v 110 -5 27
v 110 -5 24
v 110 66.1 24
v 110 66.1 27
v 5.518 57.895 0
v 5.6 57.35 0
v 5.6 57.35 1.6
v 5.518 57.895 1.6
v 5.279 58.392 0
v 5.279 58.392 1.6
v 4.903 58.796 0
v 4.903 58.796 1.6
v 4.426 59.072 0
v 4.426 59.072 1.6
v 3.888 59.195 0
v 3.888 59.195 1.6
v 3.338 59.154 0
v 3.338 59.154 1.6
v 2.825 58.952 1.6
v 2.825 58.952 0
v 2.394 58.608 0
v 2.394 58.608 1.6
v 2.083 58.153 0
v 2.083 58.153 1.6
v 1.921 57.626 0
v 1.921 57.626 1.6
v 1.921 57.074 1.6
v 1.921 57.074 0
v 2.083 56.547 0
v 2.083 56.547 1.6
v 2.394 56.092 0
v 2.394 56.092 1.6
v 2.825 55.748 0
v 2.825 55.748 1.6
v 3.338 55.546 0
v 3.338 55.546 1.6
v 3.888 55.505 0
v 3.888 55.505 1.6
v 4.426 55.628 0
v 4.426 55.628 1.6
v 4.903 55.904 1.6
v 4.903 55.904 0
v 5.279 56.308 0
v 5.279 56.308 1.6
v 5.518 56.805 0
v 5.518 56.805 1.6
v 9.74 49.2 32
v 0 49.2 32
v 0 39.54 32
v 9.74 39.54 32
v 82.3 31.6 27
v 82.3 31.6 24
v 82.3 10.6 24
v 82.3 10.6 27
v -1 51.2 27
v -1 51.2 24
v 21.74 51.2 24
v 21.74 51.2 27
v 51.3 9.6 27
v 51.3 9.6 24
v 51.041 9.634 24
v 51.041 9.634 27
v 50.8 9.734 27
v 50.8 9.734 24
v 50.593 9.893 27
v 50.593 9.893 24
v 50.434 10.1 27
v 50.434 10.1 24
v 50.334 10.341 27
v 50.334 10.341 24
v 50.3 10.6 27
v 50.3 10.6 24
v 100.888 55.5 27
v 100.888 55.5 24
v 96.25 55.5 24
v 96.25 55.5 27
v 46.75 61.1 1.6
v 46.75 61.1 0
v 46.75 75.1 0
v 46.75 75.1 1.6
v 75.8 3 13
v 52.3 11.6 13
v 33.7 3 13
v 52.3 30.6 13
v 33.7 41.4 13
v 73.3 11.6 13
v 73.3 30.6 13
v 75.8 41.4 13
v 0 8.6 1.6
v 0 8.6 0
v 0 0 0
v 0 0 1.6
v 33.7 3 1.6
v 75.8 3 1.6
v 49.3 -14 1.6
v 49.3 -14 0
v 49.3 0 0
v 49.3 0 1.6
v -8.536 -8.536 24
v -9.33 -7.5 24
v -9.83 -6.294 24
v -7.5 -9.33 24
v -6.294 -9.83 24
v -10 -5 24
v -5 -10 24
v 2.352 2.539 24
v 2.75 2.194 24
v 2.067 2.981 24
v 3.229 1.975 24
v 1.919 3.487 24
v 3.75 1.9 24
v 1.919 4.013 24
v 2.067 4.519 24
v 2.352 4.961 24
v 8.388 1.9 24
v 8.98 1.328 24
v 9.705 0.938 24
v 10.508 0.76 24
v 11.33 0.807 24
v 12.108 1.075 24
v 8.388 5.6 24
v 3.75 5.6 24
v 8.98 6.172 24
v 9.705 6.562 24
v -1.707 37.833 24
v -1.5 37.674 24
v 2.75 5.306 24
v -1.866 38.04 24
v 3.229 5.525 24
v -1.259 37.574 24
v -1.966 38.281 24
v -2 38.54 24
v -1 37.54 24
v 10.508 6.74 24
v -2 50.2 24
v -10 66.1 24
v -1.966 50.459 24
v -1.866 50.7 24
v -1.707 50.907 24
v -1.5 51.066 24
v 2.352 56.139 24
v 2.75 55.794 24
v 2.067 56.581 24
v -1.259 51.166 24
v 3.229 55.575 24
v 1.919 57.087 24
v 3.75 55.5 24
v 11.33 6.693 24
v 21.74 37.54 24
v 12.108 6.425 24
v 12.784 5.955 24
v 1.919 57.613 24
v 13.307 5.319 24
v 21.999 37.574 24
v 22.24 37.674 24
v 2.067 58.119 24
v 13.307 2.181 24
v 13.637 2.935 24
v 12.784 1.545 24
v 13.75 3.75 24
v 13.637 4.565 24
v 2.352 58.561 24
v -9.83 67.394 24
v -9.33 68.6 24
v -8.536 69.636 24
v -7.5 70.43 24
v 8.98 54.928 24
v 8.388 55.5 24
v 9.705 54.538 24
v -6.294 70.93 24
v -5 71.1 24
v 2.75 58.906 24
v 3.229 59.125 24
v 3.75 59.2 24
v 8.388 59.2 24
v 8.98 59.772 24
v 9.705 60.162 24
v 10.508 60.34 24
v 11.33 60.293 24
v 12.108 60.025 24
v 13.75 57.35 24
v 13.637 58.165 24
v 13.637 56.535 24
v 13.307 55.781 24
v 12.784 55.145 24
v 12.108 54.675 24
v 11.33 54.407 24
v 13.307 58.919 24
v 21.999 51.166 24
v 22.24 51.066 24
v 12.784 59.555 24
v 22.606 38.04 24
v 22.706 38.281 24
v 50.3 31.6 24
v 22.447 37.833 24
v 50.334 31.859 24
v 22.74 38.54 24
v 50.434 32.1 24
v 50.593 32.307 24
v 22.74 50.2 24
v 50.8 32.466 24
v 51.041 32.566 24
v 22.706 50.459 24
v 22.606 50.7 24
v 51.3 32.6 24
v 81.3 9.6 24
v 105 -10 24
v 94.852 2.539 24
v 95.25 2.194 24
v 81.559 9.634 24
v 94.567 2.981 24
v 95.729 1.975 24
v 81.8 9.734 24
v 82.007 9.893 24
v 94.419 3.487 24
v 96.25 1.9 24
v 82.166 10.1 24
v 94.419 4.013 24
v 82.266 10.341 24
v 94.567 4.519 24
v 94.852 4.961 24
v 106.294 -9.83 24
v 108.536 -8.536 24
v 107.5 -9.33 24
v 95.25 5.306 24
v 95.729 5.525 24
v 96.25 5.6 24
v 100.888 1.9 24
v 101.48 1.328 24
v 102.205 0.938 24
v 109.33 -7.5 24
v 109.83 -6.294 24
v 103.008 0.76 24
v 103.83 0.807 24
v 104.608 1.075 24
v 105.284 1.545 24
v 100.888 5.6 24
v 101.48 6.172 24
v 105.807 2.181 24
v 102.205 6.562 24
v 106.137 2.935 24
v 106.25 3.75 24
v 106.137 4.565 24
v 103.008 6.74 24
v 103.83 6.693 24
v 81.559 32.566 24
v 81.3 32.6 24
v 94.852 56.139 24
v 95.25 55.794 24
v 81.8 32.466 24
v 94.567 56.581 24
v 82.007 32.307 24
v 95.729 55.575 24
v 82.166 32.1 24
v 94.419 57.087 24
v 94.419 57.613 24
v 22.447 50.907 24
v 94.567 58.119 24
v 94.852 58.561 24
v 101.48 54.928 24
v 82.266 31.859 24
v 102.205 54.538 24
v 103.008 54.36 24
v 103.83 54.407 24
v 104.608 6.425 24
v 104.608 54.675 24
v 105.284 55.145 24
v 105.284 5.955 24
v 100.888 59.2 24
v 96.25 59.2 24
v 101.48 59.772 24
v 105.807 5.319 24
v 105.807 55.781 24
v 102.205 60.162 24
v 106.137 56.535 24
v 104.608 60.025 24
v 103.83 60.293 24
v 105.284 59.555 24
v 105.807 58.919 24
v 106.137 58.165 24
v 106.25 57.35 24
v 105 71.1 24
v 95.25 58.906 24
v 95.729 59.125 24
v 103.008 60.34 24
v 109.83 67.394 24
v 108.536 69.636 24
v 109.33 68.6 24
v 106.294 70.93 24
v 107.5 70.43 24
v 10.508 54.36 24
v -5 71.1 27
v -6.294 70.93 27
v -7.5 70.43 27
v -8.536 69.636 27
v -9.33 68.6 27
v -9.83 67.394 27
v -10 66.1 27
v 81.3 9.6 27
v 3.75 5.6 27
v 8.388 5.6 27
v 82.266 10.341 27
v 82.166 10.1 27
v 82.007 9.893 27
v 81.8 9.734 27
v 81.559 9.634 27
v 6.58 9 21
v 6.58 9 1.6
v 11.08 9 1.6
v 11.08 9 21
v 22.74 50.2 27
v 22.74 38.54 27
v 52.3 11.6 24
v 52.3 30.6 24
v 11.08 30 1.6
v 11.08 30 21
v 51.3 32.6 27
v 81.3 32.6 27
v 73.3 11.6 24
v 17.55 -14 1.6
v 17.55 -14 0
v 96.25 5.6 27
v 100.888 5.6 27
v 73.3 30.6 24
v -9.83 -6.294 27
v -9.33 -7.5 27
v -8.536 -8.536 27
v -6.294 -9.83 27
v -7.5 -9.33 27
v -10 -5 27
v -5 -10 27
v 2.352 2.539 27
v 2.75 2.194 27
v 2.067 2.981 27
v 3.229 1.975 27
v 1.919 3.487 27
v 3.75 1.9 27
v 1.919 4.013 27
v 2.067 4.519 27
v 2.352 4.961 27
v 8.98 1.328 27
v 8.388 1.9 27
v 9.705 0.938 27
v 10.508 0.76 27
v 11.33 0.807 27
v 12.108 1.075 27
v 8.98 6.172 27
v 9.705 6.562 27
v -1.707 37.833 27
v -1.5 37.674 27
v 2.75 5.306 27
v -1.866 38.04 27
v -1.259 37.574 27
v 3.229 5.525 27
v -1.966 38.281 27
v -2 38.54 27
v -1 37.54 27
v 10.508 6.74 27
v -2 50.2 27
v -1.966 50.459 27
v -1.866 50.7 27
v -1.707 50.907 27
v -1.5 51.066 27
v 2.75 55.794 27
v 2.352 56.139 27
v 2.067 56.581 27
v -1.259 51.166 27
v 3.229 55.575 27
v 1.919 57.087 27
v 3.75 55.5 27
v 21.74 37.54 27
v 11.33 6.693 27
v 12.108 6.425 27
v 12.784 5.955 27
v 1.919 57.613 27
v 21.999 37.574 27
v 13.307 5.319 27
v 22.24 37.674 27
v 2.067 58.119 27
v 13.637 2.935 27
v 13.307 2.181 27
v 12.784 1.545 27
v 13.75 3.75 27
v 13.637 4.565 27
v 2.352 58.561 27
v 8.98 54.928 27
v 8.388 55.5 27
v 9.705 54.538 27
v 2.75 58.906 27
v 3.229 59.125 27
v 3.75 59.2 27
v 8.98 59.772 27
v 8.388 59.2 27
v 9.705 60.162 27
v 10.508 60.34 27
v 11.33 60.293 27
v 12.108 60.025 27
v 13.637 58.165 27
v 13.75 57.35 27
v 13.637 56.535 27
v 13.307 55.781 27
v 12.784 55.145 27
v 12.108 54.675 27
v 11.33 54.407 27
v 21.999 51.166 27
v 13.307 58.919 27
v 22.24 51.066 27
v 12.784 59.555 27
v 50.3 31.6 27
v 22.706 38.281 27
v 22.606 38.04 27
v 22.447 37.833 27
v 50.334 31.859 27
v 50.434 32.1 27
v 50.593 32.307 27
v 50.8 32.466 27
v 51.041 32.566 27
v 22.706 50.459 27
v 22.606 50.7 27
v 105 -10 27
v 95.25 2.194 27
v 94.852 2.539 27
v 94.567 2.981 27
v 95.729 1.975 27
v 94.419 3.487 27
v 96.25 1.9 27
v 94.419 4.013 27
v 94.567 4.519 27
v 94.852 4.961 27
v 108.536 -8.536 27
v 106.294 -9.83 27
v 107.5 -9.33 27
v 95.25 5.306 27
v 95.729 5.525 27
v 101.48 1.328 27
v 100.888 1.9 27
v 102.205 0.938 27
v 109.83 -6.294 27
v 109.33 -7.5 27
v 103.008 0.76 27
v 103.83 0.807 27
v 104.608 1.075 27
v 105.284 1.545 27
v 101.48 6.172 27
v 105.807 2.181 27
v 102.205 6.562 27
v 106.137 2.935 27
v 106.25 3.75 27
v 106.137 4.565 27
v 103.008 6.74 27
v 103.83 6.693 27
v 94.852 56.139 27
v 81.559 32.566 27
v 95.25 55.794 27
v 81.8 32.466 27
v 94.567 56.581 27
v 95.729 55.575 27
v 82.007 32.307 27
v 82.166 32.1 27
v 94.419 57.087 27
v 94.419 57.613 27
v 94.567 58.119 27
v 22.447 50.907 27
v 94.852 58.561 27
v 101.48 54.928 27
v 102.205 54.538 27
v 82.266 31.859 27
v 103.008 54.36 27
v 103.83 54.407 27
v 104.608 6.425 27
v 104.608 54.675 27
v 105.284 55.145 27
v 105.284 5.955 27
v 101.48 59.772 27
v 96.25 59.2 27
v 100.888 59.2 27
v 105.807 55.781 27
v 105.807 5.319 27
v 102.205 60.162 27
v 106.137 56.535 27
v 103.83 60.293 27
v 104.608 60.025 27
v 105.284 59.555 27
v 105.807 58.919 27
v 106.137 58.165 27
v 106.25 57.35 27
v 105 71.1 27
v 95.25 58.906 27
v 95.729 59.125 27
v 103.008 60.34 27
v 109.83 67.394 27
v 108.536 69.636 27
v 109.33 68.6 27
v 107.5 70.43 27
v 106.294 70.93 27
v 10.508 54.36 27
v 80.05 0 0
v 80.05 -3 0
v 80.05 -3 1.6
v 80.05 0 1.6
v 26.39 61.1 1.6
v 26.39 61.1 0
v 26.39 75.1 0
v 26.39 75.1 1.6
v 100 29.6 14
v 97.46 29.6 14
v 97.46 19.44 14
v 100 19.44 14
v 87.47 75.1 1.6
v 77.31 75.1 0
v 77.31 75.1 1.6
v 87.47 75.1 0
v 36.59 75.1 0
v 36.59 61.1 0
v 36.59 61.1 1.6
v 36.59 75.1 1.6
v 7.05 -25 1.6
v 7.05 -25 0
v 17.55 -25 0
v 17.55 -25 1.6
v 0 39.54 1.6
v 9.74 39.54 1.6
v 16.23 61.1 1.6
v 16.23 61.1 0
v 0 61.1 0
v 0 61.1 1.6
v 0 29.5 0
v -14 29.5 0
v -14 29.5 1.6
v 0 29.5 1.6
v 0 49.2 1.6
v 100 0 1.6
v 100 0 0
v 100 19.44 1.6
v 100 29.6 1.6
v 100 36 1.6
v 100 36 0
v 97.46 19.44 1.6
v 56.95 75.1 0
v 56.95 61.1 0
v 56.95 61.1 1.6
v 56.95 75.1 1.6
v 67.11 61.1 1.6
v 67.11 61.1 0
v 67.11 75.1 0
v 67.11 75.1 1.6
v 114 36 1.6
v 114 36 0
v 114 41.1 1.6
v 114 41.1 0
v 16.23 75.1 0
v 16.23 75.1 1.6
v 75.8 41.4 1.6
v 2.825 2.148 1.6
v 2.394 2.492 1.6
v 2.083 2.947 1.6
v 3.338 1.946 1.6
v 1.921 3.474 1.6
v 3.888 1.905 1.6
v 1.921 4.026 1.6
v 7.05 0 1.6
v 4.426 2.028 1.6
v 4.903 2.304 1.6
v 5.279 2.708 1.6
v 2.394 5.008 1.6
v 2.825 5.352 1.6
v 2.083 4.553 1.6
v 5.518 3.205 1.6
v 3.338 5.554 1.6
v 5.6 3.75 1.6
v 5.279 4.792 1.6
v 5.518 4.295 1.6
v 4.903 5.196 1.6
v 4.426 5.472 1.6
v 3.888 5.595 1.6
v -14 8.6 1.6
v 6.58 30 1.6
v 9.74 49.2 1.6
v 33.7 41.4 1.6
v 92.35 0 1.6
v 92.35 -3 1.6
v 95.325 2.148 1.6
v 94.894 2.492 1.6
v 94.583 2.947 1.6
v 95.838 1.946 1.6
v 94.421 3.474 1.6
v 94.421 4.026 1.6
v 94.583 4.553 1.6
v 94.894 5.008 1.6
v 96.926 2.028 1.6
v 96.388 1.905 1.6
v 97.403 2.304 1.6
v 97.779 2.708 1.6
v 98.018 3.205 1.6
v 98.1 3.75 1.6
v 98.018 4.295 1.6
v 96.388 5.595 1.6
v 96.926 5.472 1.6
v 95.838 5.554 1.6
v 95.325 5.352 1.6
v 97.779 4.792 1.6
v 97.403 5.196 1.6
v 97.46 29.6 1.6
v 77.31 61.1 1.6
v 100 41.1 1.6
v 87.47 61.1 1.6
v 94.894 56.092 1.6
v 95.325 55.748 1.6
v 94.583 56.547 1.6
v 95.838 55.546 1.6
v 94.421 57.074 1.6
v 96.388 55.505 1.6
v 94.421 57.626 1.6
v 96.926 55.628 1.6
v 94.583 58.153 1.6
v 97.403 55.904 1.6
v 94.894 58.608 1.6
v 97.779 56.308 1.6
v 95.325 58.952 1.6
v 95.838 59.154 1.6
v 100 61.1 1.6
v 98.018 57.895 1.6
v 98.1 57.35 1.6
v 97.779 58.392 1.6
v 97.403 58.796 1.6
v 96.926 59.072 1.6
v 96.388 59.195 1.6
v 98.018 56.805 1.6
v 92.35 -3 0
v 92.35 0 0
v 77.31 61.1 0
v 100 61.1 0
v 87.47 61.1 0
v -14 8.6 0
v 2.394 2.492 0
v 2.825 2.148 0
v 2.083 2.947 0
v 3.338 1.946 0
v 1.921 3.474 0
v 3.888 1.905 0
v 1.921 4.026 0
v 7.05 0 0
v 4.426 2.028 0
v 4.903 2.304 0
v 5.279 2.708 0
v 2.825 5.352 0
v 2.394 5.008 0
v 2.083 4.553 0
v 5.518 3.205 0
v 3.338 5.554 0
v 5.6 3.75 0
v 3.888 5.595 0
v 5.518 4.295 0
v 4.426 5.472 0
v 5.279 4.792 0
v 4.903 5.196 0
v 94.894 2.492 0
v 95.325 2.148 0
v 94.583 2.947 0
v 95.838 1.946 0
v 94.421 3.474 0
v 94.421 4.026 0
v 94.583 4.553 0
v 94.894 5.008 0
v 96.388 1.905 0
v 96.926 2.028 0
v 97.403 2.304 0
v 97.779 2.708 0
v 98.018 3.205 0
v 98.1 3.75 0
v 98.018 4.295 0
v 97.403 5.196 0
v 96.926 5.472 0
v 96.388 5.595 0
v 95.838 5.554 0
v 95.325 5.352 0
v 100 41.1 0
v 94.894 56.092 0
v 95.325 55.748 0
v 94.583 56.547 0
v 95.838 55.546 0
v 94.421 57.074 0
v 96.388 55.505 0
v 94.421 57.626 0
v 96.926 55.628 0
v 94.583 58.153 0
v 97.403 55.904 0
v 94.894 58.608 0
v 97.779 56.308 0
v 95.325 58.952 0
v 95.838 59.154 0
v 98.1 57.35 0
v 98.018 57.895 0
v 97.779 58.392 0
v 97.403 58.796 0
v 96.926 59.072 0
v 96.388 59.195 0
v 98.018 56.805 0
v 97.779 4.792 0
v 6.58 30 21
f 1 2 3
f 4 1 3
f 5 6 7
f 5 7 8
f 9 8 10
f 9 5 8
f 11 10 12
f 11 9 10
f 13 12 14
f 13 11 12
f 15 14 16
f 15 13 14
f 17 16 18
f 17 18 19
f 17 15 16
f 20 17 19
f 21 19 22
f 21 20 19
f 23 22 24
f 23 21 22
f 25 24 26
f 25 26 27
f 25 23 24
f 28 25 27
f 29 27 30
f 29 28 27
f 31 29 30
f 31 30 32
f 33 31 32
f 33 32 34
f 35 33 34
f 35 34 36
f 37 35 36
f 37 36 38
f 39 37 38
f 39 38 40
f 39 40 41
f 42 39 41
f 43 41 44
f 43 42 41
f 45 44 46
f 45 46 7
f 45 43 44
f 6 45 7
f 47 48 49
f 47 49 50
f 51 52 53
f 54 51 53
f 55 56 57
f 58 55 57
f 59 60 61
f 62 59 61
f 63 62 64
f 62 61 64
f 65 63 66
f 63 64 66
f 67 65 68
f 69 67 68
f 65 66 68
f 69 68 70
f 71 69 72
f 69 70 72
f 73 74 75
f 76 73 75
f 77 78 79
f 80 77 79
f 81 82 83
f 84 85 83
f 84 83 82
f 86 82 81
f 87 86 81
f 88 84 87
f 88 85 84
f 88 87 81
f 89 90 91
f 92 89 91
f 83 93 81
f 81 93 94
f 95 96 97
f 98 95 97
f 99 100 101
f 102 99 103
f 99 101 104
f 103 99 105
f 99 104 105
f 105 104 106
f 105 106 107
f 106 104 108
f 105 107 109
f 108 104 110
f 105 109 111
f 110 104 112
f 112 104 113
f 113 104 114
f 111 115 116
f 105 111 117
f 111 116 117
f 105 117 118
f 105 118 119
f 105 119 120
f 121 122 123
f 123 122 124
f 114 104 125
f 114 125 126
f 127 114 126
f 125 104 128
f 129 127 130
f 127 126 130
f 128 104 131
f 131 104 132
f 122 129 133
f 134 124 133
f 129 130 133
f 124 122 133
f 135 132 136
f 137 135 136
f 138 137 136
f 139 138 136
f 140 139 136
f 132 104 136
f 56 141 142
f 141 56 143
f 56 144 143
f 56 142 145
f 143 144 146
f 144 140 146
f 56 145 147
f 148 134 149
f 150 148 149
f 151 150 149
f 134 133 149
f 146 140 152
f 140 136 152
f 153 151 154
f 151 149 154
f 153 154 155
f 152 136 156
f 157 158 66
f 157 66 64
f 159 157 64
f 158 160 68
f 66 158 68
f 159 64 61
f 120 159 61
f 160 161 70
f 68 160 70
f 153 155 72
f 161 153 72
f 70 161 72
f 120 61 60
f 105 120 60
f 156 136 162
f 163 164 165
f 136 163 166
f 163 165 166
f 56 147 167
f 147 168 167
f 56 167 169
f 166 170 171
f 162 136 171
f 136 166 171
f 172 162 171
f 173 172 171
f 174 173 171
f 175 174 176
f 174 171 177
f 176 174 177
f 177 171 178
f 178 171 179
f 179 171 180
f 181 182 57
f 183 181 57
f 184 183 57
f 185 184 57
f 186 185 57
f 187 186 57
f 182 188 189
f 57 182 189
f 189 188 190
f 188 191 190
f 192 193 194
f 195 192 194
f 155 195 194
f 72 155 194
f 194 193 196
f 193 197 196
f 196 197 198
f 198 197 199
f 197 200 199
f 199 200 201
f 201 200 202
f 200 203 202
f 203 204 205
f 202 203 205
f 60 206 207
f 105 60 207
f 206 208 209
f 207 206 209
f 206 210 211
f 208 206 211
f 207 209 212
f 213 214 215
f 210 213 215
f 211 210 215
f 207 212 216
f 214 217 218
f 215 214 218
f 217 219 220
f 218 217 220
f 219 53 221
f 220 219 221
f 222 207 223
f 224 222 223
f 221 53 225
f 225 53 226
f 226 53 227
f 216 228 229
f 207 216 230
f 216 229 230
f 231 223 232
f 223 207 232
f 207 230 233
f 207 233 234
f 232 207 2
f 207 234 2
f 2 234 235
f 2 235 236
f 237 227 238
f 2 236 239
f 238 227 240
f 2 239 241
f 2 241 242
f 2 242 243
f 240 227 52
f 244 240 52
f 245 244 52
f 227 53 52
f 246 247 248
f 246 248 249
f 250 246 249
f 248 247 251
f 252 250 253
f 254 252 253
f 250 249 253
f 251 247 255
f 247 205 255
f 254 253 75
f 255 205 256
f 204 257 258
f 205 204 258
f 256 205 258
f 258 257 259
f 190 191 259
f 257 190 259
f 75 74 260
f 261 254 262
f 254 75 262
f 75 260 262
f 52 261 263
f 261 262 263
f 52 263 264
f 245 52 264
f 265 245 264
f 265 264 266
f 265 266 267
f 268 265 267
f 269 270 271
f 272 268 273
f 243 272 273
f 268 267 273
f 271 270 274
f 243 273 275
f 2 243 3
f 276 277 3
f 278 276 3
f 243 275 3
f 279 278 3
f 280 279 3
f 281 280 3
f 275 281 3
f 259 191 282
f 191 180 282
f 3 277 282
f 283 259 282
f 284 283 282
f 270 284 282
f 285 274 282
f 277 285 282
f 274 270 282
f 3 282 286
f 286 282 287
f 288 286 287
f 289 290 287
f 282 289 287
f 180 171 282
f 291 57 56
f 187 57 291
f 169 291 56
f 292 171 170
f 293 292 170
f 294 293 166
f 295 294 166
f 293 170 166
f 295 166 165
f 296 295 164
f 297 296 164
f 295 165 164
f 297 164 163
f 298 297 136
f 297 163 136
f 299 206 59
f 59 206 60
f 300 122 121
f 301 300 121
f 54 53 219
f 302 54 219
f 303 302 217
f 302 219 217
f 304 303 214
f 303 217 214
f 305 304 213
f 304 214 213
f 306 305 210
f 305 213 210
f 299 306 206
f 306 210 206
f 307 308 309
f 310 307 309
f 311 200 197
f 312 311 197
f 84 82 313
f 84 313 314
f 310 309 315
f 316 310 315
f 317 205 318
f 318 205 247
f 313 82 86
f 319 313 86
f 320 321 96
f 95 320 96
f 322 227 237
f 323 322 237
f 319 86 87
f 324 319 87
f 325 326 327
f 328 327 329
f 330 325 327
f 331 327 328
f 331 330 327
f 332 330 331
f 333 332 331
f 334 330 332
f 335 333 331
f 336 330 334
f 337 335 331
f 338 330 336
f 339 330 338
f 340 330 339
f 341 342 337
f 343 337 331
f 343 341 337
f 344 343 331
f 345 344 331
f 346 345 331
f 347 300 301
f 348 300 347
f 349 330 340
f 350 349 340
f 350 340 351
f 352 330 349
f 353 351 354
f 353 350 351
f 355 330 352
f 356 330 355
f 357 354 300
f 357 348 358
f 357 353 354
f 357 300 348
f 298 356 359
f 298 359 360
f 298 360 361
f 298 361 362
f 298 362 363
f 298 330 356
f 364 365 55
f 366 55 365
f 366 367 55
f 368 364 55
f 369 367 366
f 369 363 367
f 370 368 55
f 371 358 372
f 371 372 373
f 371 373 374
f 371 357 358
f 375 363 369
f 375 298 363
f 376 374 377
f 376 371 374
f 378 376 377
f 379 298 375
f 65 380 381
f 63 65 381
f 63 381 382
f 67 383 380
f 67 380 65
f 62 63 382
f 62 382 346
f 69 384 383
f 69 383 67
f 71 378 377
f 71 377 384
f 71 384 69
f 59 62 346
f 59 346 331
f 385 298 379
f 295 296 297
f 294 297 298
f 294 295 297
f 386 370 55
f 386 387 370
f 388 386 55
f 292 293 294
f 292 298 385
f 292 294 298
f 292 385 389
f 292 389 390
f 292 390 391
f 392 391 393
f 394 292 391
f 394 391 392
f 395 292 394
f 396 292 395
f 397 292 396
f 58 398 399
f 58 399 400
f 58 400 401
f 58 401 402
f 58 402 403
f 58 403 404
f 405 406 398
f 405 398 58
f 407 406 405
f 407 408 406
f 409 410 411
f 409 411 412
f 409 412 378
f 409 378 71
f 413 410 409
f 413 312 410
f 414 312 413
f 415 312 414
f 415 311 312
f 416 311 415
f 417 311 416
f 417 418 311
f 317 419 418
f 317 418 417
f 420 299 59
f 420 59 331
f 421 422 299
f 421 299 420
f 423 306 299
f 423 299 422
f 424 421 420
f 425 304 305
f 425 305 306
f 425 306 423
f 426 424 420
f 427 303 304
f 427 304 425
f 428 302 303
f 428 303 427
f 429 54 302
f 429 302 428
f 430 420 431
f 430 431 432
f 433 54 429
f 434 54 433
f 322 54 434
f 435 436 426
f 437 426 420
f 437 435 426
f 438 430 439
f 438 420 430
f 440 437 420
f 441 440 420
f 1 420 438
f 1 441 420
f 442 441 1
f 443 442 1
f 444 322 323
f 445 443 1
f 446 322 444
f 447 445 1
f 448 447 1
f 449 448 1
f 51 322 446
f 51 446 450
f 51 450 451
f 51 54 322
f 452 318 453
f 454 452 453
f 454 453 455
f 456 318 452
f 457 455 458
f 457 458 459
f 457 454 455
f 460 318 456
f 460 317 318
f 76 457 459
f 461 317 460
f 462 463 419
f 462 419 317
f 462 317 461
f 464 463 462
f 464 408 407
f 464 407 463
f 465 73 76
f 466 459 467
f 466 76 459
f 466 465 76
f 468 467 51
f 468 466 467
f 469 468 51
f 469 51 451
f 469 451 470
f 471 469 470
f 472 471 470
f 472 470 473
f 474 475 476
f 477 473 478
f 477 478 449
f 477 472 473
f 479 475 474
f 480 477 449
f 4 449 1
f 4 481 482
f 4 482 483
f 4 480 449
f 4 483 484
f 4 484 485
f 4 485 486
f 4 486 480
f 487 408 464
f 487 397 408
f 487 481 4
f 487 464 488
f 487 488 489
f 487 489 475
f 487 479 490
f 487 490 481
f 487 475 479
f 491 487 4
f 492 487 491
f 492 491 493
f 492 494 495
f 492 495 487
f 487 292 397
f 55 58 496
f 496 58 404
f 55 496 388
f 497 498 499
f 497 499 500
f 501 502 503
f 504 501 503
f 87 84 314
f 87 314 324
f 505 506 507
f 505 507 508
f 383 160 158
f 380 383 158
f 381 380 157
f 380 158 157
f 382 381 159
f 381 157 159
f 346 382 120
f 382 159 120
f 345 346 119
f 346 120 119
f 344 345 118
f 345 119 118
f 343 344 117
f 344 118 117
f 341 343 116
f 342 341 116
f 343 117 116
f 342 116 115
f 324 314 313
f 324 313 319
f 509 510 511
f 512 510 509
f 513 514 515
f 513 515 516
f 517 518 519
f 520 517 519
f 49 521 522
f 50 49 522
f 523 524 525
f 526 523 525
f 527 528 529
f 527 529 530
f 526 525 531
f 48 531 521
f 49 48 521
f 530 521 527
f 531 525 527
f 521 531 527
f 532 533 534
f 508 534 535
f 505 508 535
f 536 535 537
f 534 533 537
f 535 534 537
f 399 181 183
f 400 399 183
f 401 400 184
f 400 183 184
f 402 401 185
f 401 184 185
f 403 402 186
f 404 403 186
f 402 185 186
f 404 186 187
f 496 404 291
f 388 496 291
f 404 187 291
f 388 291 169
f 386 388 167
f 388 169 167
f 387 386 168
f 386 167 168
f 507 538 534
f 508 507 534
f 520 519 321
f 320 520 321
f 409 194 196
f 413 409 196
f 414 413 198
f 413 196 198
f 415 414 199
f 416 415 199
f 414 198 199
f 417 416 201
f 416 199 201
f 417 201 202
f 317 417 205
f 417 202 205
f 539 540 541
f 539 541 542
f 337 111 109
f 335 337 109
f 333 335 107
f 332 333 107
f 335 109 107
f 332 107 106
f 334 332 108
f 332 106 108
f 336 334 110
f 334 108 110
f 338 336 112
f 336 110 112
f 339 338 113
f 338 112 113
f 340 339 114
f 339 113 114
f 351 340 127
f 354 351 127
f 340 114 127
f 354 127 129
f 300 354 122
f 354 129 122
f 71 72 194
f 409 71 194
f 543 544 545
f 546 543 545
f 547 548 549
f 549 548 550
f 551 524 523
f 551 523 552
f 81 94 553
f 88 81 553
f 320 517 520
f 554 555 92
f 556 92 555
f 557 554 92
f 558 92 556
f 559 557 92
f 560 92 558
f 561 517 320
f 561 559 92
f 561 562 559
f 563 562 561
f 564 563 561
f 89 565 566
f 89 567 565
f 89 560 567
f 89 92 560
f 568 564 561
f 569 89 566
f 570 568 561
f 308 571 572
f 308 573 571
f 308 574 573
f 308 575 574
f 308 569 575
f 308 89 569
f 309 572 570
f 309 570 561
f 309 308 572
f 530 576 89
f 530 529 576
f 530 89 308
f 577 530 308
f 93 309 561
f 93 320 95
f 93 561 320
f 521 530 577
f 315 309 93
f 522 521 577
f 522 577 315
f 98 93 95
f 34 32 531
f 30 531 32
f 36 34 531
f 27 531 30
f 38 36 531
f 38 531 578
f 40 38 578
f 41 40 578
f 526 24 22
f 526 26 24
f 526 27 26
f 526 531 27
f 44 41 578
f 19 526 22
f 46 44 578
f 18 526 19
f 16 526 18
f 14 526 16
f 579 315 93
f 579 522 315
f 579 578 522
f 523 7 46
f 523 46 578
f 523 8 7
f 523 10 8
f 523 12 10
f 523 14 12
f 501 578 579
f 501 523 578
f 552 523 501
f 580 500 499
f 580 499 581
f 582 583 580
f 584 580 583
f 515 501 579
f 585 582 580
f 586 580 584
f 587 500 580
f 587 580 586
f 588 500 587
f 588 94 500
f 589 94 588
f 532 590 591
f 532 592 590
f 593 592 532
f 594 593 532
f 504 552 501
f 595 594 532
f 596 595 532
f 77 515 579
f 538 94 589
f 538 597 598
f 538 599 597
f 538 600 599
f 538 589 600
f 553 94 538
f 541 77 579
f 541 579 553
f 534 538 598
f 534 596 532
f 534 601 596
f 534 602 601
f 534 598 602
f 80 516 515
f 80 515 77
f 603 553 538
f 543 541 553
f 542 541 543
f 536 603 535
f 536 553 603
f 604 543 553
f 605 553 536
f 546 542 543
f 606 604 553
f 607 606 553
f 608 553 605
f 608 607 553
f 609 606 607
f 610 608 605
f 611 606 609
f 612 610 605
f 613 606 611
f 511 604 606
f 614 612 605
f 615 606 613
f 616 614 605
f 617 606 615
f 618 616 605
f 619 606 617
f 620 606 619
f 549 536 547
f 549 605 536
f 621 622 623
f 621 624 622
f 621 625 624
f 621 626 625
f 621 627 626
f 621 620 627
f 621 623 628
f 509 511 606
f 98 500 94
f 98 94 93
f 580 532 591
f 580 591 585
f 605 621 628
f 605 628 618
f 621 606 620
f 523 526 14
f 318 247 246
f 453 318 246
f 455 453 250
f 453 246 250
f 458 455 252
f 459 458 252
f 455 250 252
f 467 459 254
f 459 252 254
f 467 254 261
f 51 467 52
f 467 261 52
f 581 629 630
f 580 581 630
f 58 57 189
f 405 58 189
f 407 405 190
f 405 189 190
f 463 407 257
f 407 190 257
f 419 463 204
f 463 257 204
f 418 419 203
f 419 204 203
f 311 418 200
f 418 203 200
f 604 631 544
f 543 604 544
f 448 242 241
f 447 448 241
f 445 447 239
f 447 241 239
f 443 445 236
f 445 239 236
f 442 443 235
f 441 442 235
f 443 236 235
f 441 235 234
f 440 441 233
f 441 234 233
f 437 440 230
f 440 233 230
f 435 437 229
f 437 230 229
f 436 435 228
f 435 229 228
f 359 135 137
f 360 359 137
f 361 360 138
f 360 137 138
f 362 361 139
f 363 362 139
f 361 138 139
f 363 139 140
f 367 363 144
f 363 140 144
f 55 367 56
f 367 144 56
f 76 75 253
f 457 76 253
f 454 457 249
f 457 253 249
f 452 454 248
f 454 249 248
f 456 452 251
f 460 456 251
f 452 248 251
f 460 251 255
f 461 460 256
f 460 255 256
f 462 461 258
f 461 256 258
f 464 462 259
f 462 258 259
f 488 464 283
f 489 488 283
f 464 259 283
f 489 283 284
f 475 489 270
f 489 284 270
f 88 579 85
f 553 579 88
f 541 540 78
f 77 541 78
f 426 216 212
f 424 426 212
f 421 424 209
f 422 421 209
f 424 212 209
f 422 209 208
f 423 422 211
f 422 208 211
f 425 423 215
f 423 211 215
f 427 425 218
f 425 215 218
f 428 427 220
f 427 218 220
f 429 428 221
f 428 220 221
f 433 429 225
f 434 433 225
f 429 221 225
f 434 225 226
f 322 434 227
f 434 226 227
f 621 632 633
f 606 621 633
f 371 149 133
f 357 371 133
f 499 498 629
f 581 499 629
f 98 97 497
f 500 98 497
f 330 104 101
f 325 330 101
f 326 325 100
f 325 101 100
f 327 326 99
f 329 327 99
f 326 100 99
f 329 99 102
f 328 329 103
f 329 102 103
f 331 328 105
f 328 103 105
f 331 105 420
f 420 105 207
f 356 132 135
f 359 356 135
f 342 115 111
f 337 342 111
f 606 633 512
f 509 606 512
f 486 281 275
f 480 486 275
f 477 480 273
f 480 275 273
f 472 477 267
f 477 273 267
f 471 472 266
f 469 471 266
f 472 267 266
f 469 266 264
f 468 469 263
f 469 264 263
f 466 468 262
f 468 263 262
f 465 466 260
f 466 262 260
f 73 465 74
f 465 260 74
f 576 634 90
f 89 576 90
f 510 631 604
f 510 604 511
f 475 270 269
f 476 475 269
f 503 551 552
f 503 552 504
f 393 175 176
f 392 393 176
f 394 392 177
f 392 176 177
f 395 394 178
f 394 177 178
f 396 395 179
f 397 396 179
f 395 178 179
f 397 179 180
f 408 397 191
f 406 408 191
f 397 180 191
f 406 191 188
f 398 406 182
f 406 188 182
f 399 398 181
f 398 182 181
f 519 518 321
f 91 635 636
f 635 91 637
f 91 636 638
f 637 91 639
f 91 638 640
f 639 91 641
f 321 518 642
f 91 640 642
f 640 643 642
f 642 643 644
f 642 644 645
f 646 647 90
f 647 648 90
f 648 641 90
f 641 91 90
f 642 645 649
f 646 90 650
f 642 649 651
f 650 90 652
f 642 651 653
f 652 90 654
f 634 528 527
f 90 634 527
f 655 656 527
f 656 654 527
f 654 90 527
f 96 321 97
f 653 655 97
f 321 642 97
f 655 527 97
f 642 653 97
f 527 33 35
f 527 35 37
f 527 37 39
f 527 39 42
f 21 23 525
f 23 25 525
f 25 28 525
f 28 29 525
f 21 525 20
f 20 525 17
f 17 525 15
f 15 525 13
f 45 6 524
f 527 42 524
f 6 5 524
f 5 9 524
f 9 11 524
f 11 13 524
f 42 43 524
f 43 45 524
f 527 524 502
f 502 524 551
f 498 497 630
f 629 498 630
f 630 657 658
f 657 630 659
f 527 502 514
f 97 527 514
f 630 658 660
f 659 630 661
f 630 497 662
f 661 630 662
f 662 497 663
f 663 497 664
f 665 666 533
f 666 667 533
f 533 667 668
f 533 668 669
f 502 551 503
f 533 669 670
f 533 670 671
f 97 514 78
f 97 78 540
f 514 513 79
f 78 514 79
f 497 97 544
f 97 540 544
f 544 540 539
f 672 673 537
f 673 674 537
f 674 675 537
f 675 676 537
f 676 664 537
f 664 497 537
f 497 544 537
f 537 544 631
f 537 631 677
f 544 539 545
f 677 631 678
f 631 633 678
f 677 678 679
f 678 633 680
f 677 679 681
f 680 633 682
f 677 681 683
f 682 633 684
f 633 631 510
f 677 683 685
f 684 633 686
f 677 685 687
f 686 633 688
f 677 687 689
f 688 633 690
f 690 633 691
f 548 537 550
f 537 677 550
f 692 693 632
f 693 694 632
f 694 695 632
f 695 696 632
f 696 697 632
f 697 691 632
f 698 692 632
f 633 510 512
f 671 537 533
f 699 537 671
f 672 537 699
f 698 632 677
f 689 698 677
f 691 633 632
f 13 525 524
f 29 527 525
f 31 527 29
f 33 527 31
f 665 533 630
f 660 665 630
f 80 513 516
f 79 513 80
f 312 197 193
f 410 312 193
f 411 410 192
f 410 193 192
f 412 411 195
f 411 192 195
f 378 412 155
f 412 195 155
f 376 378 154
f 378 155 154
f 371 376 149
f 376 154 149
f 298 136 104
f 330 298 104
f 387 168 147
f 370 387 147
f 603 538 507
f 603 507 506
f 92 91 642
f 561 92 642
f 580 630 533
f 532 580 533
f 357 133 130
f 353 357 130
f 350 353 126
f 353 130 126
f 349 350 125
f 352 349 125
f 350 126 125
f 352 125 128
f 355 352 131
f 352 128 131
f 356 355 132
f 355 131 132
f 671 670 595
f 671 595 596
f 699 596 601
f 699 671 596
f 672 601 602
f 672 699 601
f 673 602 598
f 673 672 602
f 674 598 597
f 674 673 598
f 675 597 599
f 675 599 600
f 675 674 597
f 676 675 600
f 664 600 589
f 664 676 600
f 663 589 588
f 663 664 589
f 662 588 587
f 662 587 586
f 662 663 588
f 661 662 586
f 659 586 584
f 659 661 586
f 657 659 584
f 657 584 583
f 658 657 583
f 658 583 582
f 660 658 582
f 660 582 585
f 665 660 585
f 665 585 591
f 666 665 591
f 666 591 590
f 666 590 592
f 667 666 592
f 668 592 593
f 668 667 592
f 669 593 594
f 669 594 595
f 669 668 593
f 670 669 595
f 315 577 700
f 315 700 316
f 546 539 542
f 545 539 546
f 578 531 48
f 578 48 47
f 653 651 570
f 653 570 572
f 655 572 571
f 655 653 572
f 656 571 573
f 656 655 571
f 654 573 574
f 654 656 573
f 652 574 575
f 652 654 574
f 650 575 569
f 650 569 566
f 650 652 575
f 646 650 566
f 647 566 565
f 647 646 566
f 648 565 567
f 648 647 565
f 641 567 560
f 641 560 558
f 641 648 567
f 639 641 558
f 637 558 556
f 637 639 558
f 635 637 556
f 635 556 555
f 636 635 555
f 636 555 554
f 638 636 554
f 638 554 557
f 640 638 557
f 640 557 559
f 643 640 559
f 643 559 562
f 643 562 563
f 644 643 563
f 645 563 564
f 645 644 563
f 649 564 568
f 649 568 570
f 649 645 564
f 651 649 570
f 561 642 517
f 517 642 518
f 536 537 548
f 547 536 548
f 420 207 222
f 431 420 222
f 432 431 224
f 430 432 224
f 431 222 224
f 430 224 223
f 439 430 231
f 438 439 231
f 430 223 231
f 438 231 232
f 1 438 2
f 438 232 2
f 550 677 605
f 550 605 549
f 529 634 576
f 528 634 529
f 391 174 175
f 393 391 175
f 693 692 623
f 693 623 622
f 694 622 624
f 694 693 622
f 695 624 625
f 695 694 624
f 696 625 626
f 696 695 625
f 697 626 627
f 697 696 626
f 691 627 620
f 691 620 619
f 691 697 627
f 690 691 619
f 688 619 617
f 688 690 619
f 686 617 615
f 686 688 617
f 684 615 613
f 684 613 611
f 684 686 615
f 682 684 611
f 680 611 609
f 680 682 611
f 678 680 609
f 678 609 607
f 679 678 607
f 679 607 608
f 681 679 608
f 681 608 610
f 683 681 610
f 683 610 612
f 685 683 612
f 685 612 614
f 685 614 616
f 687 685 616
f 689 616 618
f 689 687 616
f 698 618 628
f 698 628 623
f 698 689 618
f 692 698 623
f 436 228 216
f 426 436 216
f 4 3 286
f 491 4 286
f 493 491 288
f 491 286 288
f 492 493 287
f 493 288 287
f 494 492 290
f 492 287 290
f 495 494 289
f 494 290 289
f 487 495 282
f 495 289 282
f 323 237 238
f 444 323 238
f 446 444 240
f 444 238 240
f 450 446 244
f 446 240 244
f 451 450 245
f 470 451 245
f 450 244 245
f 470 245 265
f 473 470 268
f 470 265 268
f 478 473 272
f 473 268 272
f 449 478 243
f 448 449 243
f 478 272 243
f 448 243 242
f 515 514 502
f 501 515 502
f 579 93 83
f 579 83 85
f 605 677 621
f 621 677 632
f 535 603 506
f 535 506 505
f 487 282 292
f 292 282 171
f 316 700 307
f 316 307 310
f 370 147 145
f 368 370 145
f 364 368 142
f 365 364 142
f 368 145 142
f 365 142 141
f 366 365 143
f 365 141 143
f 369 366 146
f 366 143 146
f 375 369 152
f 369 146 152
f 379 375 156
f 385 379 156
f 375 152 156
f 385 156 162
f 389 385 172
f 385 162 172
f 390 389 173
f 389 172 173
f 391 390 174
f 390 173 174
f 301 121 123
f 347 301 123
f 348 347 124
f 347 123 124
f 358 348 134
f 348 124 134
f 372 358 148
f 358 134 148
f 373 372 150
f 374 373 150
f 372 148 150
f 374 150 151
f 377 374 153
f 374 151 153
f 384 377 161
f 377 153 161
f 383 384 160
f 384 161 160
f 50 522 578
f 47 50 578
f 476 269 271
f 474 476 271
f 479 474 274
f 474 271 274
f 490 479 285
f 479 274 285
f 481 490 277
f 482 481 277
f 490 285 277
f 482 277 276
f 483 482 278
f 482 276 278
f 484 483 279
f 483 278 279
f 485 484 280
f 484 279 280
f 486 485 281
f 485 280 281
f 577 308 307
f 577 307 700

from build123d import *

# Parameters (mm, degrees)
F0_R     = 1.85
F0_W     = 4.5
F0_H     = 21
F0_W_2   = 14
F0_H_2   = 20.9
F0_W_3   = 0.05
F0_H_3   = 14
F0_W_4   = 31.75
F0_W_5   = 9.74
F0_H_4   = 9.66
F0_W_6   = 12.3
F0_H_5   = 3
F0_W_7   = 10.16
F0_W_8   = 2.54
F0_H_6   = 10.16
F0_H_7   = 5.1
F1_DEPTH = 1.6
F2_DEPTH = 32
F3_DEPTH = 21
F4_DEPTH = 14
F5_W     = 42.1
F5_H     = 38.4
F5_W_2   = 21
F5_H_2   = 19
F6_DEPTH = 13
F7_DEPTH = 24
F9_DEPTH = 3


with BuildPart() as f1:
    # F0 (on Top) → F1 (new body)
    with BuildSketch(Plane.XY):
        Polygon((0, 8.6), (0, 0), (7.05, 0), (17.5, 0), (17.55, 0), (49.3, 0), (80.05, 0), (92.35, 0), (100, 0), (100, 19.44), (97.46, 19.44), (97.46, 29.6), (100, 29.6), (100, 36), (100, 41.1), (100, 61.1), (87.47, 61.1), (77.31, 61.1), (67.11, 61.1), (56.95, 61.1), (46.75, 61.1), (36.59, 61.1), (26.39, 61.1), (16.23, 61.1), (0, 61.1), (0, 49.2), (9.74, 49.2), (9.74, 39.54), (0, 39.54), (0, 29.5), align=None)
        with Locations((3.75, 3.75)):
            Circle(F0_R, mode=Mode.SUBTRACT)
        with Locations((8.83, 19.5)):
            Rectangle(F0_W, F0_H, mode=Mode.SUBTRACT)
        with Locations((96.25, 3.75)):
            Circle(F0_R, mode=Mode.SUBTRACT)
        with Locations((3.75, 57.35)):
            Circle(F0_R, mode=Mode.SUBTRACT)
        with Locations((96.25, 57.35)):
            Circle(F0_R, mode=Mode.SUBTRACT)
        Polygon((17.5, 0), (7.05, 0), (7.05, -25), (17.55, -25), (17.55, -14), (17.5, -14), align=None)
        with Locations((-7, 19.05)):
            Rectangle(F0_W_2, F0_H_2)
        with Locations((17.525, -7)):
            Rectangle(F0_W_3, F0_H_3)
        with Locations((33.425, -7)):
            Rectangle(F0_W_4, F0_H_3)
        with Locations((4.87, 44.37)):
            Rectangle(F0_W_5, F0_H_4)
        with Locations((86.2, -1.5)):
            Rectangle(F0_W_6, F0_H_5)
        with Locations((21.31, 68.1)):
            Rectangle(F0_W_7, F0_H_3)
        with Locations((98.73, 24.52)):
            Rectangle(F0_W_8, F0_H_6)
        with Locations((41.67, 68.1)):
            Rectangle(F0_W_7, F0_H_3)
        with Locations((107, 38.55)):
            Rectangle(F0_W_2, F0_H_7)
        with Locations((62.03, 68.1)):
            Rectangle(F0_W_7, F0_H_3)
        with Locations((82.39, 68.1)):
            Rectangle(F0_W_7, F0_H_3)
        with Locations((8.83, 19.5)):
            Rectangle(F0_W, F0_H)
    extrude(amount=F1_DEPTH)

    # F0 (on Top) → F2 (join)
    with BuildSketch(Plane.XY):
        with Locations((4.87, 44.37)):
            Rectangle(F0_W_5, F0_H_4)
    extrude(amount=F2_DEPTH)

    # F0 (on Top) → F3 (join)
    with BuildSketch(Plane.XY):
        with Locations((8.83, 19.5)):
            Rectangle(F0_W, F0_H)
    extrude(amount=F3_DEPTH)

    # F0 (on Top) → F4 (join)
    with BuildSketch(Plane.XY):
        with Locations((98.73, 24.52)):
            Rectangle(F0_W_8, F0_H_6)
    extrude(amount=F4_DEPTH)

    # F5 (on Top) → F6 (join)
    with BuildSketch(Plane.XY):
        with Locations((54.75, 22.2)):
            Rectangle(F5_W, F5_H)
        with Locations((62.8, 21.1)):
            Rectangle(F5_W_2, F5_H_2, mode=Mode.SUBTRACT)
        with Locations((62.8, 21.1)):
            Rectangle(F5_W_2, F5_H_2)
    extrude(amount=F6_DEPTH)

    # F5 (on Top) → F7 (join)
    with BuildSketch(Plane.XY):
        with Locations((62.8, 21.1)):
            Rectangle(F5_W_2, F5_H_2)
    extrude(amount=F7_DEPTH)


with BuildPart() as f9:
    # F8 (on face) → F9 (new body)
    with BuildSketch(Plane.XY.offset(24)):
        with BuildLine():
            Line((105, 71.1), (-5, 71.1))
            ThreePointArc((-5, 71.1), (-8.5355339059, 69.6355339059), (-10, 66.1))
            Line((-10, 66.1), (-10, -5))
            ThreePointArc((-10, -5), (-8.5355339059, -8.5355339059), (-5, -10))
            Line((-5, -10), (105, -10))
            ThreePointArc((105, -10), (108.5355339059, -8.5355339059), (110, -5))
            Line((110, -5), (110, 66.1))
            ThreePointArc((110, 66.1), (108.5355339059, 69.6355339059), (105, 71.1))
        make_face()
        with BuildLine():
            ThreePointArc((3.75, 1.9), (1.9, 3.75), (3.75, 5.6))
            Line((3.75, 5.6), (8.3883268643, 5.6))
            ThreePointArc((8.3883268643, 5.6), (11.7285143312, 6.5859318933), (13.75, 3.75))
            ThreePointArc((13.75, 3.75), (11.7285143312, 0.9140681067), (8.3883268643, 1.9))
            Line((8.3883268643, 1.9), (3.75, 1.9))
        make_face(mode=Mode.SUBTRACT)
        with BuildLine():
            ThreePointArc((96.25, 1.9), (94.4, 3.75), (96.25, 5.6))
            Line((96.25, 5.6), (100.8883268643, 5.6))
            ThreePointArc((100.8883268643, 5.6), (104.2285143312, 6.5859318933), (106.25, 3.75))
            ThreePointArc((106.25, 3.75), (104.2285143312, 0.9140681067), (100.8883268643, 1.9))
            Line((100.8883268643, 1.9), (96.25, 1.9))
        make_face(mode=Mode.SUBTRACT)
        with BuildLine():
            ThreePointArc((50.3, 31.6), (50.5928932188, 32.3071067812), (51.3, 32.6))
            Line((51.3, 32.6), (81.3, 32.6))
            ThreePointArc((81.3, 32.6), (82.0071067812, 32.3071067812), (82.3, 31.6))
            Line((82.3, 31.6), (82.3, 10.6))
            ThreePointArc((82.3, 10.6), (82.0071067812, 9.8928932188), (81.3, 9.6))
            Line((81.3, 9.6), (51.3, 9.6))
            ThreePointArc((51.3, 9.6), (50.5928932188, 9.8928932188), (50.3, 10.6))
            Line((50.3, 10.6), (50.3, 31.6))
        make_face(mode=Mode.SUBTRACT)
        with BuildLine():
            Line((21.74, 37.54), (-1, 37.54))
            ThreePointArc((-1, 37.54), (-1.7071067812, 37.8328932188), (-2, 38.54))
            Line((-2, 38.54), (-2, 50.2))
            ThreePointArc((-2, 50.2), (-1.7071067812, 50.9071067812), (-1, 51.2))
            Line((-1, 51.2), (21.74, 51.2))
            ThreePointArc((21.74, 51.2), (22.4471067812, 50.9071067812), (22.74, 50.2))
            Line((22.74, 50.2), (22.74, 38.54))
            ThreePointArc((22.74, 38.54), (22.4471067812, 37.8328932188), (21.74, 37.54))
        make_face(mode=Mode.SUBTRACT)
        with BuildLine():
            ThreePointArc((3.75, 55.5), (1.9, 57.35), (3.75, 59.2))
            Line((3.75, 59.2), (8.3883268643, 59.2))
            ThreePointArc((8.3883268643, 59.2), (11.7285143312, 60.1859318933), (13.75, 57.35))
            ThreePointArc((13.75, 57.35), (11.7285143312, 54.5140681067), (8.3883268643, 55.5))
            Line((8.3883268643, 55.5), (3.75, 55.5))
        make_face(mode=Mode.SUBTRACT)
        with BuildLine():
            ThreePointArc((96.25, 55.5), (94.4, 57.35), (96.25, 59.2))
            Line((96.25, 59.2), (100.8883268643, 59.2))
            ThreePointArc((100.8883268643, 59.2), (104.2285143312, 60.1859318933), (106.25, 57.35))
            ThreePointArc((106.25, 57.35), (104.2285143312, 54.5140681067), (100.8883268643, 55.5))
            Line((100.8883268643, 55.5), (96.25, 55.5))
        make_face(mode=Mode.SUBTRACT)
    extrude(amount=F9_DEPTH)


solid = Compound([f1.part, f9.part])
